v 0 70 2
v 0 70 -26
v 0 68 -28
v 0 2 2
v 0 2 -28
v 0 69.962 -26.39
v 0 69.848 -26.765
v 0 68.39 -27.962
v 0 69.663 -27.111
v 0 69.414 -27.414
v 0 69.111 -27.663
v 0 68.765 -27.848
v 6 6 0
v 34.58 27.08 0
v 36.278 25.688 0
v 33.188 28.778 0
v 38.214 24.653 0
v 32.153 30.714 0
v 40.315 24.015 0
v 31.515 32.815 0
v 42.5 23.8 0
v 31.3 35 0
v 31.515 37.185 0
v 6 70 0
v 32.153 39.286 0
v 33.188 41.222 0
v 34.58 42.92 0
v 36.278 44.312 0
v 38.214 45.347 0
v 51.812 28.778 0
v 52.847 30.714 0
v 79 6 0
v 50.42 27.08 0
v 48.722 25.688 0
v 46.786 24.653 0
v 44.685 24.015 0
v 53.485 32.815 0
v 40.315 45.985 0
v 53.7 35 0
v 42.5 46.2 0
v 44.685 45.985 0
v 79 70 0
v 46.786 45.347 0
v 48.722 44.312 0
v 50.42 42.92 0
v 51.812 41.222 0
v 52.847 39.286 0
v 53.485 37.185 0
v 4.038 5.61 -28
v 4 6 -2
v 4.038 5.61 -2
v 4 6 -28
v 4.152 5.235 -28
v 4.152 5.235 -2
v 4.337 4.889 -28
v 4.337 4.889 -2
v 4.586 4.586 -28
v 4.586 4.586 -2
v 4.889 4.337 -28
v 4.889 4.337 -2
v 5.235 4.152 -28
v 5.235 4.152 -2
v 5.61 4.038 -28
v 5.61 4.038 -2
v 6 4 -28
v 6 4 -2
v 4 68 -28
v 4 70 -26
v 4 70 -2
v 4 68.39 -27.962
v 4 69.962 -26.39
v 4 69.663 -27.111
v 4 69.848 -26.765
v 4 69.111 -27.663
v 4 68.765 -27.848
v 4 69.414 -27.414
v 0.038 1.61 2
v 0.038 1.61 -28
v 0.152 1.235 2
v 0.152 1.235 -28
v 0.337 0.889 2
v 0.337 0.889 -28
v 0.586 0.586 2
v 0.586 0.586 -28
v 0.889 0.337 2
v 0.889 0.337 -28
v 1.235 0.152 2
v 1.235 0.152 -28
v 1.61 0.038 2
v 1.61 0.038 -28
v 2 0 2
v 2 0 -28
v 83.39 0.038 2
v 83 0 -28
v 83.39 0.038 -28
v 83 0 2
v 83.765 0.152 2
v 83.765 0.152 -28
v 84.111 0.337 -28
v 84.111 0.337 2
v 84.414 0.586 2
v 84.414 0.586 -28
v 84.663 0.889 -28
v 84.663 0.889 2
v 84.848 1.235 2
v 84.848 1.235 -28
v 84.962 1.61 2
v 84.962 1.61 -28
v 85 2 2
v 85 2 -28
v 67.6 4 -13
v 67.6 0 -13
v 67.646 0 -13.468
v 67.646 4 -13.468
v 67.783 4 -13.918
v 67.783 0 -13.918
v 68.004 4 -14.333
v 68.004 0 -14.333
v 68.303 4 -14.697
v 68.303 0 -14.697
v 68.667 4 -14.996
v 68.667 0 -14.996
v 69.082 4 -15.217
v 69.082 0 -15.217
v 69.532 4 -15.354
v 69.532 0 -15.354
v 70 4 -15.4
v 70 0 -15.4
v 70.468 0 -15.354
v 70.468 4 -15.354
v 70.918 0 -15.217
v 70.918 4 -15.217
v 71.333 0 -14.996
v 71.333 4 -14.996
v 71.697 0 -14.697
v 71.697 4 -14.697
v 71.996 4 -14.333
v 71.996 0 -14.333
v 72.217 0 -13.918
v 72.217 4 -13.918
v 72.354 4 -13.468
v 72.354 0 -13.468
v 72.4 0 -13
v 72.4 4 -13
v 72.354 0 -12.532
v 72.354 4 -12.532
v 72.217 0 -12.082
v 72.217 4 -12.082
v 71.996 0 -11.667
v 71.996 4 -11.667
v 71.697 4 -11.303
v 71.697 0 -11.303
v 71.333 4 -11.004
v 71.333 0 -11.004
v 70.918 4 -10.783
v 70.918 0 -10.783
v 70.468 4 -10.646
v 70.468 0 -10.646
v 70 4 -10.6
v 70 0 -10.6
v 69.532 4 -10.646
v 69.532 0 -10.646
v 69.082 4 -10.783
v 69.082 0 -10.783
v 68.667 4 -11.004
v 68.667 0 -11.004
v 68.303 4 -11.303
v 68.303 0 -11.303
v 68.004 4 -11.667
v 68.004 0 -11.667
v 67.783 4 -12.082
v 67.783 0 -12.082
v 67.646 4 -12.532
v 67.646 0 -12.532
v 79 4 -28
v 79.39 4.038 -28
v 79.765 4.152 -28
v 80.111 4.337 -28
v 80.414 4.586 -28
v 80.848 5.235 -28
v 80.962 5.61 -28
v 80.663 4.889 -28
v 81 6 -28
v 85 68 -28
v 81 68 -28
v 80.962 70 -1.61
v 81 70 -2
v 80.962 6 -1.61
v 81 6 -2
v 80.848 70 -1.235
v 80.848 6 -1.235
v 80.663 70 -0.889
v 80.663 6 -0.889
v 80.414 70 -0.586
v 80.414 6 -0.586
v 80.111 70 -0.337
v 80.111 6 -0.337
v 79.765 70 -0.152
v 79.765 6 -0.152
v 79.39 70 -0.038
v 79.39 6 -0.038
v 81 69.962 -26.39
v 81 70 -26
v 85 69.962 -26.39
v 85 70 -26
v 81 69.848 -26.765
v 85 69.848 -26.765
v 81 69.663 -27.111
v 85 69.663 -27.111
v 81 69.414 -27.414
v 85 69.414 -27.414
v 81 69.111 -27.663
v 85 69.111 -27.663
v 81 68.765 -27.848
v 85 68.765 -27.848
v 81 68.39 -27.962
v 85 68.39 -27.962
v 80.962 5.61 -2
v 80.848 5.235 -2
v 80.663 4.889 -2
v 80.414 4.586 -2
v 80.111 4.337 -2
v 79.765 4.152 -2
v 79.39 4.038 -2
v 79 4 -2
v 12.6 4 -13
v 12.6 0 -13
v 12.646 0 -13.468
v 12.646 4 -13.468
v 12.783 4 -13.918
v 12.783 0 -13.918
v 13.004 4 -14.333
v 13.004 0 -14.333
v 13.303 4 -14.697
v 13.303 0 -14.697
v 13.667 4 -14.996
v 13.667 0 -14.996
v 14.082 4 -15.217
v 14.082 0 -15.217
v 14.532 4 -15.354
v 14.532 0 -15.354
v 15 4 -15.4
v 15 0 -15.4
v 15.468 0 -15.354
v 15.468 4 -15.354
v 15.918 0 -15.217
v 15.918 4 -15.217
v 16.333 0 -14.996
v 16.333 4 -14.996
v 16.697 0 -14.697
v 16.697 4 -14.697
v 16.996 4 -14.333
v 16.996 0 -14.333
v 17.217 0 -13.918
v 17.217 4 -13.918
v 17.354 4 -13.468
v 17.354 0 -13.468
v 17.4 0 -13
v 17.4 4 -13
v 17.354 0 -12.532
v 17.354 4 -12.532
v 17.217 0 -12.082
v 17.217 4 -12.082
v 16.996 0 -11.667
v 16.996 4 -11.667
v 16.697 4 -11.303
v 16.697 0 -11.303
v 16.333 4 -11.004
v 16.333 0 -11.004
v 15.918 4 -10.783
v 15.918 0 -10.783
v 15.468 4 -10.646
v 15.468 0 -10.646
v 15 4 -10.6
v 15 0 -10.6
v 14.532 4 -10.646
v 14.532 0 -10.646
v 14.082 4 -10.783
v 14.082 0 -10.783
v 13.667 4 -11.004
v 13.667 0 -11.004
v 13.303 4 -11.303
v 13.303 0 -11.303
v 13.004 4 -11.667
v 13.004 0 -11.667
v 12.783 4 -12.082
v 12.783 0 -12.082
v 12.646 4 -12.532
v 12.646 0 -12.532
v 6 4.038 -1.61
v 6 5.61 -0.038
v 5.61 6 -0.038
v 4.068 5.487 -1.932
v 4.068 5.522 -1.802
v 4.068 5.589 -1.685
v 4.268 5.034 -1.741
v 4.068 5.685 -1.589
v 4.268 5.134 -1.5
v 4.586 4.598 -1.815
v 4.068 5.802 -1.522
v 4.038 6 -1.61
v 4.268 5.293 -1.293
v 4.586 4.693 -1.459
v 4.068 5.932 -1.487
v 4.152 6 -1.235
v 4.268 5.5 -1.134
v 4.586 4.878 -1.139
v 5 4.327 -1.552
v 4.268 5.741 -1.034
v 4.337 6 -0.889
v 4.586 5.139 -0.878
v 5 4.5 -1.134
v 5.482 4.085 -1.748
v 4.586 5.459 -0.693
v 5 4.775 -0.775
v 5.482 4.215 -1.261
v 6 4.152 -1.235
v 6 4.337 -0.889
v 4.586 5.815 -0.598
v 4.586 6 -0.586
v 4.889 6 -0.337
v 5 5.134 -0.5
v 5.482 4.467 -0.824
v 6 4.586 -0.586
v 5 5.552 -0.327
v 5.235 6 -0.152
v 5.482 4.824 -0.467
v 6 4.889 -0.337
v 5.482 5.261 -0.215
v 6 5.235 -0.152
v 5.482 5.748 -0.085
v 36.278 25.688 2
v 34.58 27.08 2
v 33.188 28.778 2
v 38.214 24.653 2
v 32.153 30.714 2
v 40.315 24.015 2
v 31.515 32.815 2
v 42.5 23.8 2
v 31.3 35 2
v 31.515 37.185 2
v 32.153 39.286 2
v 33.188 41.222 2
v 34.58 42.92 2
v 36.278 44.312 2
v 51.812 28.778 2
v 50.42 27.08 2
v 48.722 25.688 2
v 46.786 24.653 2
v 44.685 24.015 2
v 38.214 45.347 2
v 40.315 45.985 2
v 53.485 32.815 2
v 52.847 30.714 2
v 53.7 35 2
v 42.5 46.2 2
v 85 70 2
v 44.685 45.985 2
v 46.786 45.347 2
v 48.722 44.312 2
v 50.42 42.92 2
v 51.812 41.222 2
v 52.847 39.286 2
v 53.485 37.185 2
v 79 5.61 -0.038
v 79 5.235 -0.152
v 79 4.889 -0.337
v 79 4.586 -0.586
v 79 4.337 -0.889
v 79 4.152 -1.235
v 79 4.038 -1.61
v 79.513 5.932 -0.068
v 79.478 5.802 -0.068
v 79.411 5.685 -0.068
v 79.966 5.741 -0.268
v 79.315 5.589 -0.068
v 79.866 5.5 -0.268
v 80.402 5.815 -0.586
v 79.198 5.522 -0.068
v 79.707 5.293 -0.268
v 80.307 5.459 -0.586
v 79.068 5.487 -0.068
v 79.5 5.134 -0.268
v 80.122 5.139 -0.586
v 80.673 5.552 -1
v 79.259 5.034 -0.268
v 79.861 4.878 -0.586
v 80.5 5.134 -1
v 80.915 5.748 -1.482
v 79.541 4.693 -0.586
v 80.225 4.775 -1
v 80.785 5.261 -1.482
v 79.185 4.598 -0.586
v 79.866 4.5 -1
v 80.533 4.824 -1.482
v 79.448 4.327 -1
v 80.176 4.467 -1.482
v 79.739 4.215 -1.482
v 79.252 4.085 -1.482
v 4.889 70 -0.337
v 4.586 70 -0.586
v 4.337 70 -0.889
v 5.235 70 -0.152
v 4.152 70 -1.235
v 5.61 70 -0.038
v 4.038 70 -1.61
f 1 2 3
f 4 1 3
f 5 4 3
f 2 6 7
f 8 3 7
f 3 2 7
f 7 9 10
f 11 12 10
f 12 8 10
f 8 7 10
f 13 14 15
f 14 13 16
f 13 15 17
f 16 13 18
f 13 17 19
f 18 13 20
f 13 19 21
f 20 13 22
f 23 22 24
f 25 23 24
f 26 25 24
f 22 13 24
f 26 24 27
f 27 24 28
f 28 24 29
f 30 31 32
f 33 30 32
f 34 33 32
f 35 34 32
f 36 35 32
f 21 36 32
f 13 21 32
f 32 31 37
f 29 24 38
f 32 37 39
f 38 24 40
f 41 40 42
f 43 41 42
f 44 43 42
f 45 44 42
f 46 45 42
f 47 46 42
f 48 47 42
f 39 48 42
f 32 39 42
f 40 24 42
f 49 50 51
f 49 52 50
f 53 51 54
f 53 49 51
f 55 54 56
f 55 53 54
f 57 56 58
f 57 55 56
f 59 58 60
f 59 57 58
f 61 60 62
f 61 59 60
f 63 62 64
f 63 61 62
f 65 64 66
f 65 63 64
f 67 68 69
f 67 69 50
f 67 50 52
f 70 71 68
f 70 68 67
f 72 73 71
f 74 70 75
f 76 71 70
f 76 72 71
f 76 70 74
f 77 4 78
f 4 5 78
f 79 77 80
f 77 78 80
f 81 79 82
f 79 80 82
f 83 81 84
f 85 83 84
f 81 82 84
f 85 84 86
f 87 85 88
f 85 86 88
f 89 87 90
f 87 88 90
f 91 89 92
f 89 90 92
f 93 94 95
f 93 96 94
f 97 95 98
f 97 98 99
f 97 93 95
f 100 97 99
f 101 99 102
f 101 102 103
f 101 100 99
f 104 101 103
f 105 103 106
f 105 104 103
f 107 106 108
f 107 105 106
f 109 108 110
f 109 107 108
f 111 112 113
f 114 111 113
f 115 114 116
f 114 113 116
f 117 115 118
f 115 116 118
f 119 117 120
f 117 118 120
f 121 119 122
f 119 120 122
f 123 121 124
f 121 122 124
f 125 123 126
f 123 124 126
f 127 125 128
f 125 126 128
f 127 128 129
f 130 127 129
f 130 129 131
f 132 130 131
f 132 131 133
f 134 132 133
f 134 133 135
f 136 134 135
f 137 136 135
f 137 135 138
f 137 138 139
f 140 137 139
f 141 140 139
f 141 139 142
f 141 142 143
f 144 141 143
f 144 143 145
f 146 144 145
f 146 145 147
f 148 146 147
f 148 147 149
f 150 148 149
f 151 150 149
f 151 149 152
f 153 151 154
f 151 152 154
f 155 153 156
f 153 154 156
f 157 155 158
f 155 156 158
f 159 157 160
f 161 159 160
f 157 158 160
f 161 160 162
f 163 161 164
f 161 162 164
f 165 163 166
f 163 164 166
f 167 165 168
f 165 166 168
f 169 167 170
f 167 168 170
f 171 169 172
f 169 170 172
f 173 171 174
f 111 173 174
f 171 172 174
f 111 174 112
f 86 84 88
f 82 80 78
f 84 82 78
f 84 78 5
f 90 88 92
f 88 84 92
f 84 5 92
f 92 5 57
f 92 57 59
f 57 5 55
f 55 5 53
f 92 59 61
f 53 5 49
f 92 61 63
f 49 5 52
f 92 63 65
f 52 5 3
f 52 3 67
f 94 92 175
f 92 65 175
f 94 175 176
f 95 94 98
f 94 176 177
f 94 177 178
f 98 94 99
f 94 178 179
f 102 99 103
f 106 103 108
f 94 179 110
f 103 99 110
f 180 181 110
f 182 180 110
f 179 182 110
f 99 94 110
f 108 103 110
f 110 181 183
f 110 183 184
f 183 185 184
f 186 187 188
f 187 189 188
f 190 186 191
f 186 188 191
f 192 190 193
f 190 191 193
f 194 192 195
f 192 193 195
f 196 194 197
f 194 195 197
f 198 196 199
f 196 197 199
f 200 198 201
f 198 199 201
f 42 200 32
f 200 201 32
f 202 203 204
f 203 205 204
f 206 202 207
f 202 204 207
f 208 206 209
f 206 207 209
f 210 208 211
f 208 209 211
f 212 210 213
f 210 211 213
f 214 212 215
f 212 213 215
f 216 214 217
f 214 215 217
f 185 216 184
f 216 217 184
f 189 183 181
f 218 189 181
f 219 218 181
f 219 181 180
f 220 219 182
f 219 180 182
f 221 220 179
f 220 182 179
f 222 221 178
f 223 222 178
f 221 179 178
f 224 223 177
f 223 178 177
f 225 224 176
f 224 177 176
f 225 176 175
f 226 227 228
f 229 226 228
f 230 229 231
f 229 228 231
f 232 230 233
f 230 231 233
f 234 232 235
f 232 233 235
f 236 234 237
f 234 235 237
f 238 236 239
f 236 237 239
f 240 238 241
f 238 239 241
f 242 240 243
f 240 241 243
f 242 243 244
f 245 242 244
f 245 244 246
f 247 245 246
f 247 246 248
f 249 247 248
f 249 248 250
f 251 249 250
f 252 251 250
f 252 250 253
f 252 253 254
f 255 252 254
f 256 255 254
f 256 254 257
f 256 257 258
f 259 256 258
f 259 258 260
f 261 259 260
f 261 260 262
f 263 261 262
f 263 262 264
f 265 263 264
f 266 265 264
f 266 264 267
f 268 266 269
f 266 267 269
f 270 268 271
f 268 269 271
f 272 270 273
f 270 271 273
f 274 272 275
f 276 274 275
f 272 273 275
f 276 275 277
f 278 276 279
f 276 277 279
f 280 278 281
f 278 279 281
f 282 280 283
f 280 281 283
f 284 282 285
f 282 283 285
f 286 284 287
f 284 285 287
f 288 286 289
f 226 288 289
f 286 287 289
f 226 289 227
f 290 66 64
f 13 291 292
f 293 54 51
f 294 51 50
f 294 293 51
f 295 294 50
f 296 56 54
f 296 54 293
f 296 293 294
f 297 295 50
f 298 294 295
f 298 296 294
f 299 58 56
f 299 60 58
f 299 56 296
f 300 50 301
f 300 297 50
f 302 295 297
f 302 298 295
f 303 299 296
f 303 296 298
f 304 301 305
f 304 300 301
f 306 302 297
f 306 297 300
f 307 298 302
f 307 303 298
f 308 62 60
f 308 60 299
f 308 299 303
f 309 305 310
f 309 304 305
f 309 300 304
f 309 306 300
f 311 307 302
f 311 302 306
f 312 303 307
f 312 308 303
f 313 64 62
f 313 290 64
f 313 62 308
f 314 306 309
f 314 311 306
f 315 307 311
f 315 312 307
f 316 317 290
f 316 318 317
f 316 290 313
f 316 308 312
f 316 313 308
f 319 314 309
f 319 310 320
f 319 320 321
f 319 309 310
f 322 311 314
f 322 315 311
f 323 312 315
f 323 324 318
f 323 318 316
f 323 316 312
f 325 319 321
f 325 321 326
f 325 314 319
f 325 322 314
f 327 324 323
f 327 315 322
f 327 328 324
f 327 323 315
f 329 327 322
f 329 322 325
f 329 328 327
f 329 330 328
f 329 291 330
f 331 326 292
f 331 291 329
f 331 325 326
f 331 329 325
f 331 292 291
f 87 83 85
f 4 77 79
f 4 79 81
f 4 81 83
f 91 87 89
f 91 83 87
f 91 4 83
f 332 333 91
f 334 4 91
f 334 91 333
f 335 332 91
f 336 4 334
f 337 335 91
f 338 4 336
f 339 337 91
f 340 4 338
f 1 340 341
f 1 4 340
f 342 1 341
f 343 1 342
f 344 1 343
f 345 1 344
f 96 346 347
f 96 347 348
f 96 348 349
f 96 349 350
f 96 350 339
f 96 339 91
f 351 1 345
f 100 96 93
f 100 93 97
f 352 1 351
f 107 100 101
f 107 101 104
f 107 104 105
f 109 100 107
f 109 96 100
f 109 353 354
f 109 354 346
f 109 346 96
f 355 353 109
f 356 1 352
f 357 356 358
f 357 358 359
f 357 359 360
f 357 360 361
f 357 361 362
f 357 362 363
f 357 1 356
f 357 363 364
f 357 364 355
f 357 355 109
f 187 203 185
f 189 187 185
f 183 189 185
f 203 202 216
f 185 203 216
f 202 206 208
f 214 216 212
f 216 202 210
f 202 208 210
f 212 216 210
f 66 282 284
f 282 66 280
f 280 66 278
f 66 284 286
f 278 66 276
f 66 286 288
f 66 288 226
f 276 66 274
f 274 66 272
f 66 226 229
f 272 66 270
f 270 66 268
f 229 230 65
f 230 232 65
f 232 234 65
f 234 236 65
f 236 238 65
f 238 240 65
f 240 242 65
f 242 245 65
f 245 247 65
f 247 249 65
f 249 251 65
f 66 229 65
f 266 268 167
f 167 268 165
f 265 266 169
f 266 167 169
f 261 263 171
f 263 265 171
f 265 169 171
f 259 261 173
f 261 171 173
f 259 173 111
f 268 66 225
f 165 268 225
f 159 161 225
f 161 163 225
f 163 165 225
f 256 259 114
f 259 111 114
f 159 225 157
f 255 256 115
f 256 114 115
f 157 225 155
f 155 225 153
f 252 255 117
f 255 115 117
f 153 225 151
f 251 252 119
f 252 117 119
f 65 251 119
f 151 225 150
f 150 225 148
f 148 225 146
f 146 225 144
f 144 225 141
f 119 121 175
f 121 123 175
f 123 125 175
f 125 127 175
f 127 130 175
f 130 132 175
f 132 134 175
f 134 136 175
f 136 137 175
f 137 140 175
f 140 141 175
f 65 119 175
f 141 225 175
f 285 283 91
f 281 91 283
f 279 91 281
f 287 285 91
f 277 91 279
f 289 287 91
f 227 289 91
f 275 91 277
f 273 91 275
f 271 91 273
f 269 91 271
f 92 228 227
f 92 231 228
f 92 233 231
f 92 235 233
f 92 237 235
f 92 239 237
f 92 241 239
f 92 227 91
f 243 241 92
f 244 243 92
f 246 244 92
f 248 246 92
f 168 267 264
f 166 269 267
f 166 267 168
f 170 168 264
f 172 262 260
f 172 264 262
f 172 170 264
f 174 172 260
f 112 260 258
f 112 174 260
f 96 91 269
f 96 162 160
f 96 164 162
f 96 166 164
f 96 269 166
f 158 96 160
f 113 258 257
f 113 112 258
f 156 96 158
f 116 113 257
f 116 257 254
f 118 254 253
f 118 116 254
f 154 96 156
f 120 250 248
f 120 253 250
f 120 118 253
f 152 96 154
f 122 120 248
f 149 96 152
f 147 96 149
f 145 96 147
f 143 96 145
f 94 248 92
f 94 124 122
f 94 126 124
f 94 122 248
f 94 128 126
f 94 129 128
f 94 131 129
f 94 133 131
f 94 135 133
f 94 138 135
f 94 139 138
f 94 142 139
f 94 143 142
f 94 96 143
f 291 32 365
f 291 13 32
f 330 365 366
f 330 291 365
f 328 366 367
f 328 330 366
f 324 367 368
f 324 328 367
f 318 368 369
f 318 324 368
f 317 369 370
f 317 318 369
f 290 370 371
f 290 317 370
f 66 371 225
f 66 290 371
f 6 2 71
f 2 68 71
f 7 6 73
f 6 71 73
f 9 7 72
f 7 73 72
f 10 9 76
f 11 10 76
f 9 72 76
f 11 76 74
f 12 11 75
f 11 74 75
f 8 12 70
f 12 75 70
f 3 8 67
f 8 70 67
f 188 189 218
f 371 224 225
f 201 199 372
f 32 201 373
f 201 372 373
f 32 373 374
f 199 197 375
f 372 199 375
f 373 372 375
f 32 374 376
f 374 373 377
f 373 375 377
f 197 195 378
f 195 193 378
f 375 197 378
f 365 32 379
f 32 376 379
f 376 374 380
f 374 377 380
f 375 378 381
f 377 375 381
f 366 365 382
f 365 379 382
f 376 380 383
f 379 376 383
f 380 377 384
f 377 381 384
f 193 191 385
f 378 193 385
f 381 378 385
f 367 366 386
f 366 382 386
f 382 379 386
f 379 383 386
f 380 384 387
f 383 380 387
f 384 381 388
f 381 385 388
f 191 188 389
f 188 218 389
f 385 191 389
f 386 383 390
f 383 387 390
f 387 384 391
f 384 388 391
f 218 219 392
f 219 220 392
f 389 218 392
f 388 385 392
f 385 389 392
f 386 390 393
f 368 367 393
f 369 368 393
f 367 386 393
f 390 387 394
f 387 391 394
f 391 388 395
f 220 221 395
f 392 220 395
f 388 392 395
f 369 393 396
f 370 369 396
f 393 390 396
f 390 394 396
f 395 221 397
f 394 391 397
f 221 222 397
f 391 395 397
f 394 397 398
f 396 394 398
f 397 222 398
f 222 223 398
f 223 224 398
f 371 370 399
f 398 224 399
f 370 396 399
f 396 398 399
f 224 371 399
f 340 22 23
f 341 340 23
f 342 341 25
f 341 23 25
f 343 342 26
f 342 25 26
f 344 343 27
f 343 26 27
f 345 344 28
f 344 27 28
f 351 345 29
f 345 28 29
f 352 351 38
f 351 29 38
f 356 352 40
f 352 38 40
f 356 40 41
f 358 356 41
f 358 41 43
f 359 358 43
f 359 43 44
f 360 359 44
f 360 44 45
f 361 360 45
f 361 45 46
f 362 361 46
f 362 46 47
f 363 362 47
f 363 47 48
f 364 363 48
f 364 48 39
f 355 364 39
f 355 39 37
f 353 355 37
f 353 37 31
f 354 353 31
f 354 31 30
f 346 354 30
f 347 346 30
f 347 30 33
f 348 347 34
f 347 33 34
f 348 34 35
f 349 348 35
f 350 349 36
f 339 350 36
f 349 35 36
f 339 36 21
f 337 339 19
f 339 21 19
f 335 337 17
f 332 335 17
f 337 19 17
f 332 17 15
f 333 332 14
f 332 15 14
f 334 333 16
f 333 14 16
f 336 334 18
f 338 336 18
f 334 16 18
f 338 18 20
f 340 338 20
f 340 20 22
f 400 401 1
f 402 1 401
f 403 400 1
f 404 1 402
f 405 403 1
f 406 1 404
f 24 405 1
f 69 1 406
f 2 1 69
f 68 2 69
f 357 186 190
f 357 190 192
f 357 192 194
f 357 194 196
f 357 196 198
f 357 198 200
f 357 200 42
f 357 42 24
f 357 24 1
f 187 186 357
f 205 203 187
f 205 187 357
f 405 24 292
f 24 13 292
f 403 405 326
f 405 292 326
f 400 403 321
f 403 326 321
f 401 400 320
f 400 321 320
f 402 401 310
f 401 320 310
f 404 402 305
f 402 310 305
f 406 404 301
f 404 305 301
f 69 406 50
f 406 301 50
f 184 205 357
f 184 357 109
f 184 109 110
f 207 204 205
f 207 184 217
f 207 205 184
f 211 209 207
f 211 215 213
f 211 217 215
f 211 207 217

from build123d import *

# Parameters (mm, degrees)
SKETCH1_W            = 85
SKETCH1_H            = 70
BOSS_EXTRUDE1_DEPTH  = 2
HOLE1_D              = 22.4
SKETCH5_W            = 28
SKETCH5_H            = 4
BOSS_EXTRUDE2_DEPTH  = 85
BOSS_EXTRUDE3_REACH  = 115.618
SKETCH6_W            = 4
SKETCH6_H            = 28
M4_CLEARANCE_HOLE1_D = 4.8
FILLET1_R            = 2


with BuildPart() as part:
    # Sketch1 → Boss-Extrude1 (new body)
    with BuildSketch(Plane.XY):
        with Locations((42.5, 35)):
            Rectangle(SKETCH1_W, SKETCH1_H)
    extrude(amount=BOSS_EXTRUDE1_DEPTH)

    # Hole1 (through all)
    with Locations(Plane.XY.offset(2)):
        with Locations((42.5, 35)):
            Hole(HOLE1_D / 2)

    # Sketch5 → Boss-Extrude2 (add)
    with BuildSketch(Plane(origin=(85, 0, 0), x_dir=(0, 0, -1), z_dir=(1, 0, 0))):
        with Locations((14, 2)):
            Rectangle(SKETCH5_W, SKETCH5_H)
    extrude(amount=-BOSS_EXTRUDE2_DEPTH)

    # Sketch6 → Boss-Extrude3 (add, up to next)
    with BuildSketch(Plane(origin=(0, 70, 0), x_dir=(1, 0, 0), z_dir=(0, 1, 0)), mode=Mode.PRIVATE) as boss_extrude3_sk1:
        with Locations((83, 14)):
            Rectangle(SKETCH6_W, SKETCH6_H)
    boss_extrude3_tool1 = extrude(boss_extrude3_sk1.sketch, amount=-BOSS_EXTRUDE3_REACH, mode=Mode.PRIVATE) - part.part
    # Sketch6 → Boss-Extrude3 (add, up to next)
    with BuildSketch(Plane(origin=(0, 70, 0), x_dir=(1, 0, 0), z_dir=(0, 1, 0)), mode=Mode.PRIVATE) as boss_extrude3_sk2:
        with Locations((2, 14)):
            Rectangle(SKETCH6_W, SKETCH6_H)
    boss_extrude3_tool2 = extrude(boss_extrude3_sk2.sketch, amount=-BOSS_EXTRUDE3_REACH, mode=Mode.PRIVATE) - part.part
    add(boss_extrude3_tool1.solids().sort_by_distance((83, 70, -14))[0])
    add(boss_extrude3_tool2.solids().sort_by_distance((2, 70, -14))[0])

    # M4 Clearance Hole1 (through all)
    with Locations(Plane(origin=(0, 4, 0), x_dir=(1, 0, 0), z_dir=(0, 1, 0))):
        with Locations((15, 13), (70, 13)):
            Hole(M4_CLEARANCE_HOLE1_D / 2)

    # Fillet1
    fillet1_edges = [part.edges().sort_by_distance(p)[0] for p in [
        (81, 4, -14),
        (81, 37, 0),
        (83, 70, -28),
        (42.5, 4, 0),
        (4, 4, -14),
        (2, 70, -28),
        (4, 37, 0),
        (85, 0, -13),
        (0, 0, -13),
    ]]
    fillet(fillet1_edges, radius=FILLET1_R)


solid = part.part
